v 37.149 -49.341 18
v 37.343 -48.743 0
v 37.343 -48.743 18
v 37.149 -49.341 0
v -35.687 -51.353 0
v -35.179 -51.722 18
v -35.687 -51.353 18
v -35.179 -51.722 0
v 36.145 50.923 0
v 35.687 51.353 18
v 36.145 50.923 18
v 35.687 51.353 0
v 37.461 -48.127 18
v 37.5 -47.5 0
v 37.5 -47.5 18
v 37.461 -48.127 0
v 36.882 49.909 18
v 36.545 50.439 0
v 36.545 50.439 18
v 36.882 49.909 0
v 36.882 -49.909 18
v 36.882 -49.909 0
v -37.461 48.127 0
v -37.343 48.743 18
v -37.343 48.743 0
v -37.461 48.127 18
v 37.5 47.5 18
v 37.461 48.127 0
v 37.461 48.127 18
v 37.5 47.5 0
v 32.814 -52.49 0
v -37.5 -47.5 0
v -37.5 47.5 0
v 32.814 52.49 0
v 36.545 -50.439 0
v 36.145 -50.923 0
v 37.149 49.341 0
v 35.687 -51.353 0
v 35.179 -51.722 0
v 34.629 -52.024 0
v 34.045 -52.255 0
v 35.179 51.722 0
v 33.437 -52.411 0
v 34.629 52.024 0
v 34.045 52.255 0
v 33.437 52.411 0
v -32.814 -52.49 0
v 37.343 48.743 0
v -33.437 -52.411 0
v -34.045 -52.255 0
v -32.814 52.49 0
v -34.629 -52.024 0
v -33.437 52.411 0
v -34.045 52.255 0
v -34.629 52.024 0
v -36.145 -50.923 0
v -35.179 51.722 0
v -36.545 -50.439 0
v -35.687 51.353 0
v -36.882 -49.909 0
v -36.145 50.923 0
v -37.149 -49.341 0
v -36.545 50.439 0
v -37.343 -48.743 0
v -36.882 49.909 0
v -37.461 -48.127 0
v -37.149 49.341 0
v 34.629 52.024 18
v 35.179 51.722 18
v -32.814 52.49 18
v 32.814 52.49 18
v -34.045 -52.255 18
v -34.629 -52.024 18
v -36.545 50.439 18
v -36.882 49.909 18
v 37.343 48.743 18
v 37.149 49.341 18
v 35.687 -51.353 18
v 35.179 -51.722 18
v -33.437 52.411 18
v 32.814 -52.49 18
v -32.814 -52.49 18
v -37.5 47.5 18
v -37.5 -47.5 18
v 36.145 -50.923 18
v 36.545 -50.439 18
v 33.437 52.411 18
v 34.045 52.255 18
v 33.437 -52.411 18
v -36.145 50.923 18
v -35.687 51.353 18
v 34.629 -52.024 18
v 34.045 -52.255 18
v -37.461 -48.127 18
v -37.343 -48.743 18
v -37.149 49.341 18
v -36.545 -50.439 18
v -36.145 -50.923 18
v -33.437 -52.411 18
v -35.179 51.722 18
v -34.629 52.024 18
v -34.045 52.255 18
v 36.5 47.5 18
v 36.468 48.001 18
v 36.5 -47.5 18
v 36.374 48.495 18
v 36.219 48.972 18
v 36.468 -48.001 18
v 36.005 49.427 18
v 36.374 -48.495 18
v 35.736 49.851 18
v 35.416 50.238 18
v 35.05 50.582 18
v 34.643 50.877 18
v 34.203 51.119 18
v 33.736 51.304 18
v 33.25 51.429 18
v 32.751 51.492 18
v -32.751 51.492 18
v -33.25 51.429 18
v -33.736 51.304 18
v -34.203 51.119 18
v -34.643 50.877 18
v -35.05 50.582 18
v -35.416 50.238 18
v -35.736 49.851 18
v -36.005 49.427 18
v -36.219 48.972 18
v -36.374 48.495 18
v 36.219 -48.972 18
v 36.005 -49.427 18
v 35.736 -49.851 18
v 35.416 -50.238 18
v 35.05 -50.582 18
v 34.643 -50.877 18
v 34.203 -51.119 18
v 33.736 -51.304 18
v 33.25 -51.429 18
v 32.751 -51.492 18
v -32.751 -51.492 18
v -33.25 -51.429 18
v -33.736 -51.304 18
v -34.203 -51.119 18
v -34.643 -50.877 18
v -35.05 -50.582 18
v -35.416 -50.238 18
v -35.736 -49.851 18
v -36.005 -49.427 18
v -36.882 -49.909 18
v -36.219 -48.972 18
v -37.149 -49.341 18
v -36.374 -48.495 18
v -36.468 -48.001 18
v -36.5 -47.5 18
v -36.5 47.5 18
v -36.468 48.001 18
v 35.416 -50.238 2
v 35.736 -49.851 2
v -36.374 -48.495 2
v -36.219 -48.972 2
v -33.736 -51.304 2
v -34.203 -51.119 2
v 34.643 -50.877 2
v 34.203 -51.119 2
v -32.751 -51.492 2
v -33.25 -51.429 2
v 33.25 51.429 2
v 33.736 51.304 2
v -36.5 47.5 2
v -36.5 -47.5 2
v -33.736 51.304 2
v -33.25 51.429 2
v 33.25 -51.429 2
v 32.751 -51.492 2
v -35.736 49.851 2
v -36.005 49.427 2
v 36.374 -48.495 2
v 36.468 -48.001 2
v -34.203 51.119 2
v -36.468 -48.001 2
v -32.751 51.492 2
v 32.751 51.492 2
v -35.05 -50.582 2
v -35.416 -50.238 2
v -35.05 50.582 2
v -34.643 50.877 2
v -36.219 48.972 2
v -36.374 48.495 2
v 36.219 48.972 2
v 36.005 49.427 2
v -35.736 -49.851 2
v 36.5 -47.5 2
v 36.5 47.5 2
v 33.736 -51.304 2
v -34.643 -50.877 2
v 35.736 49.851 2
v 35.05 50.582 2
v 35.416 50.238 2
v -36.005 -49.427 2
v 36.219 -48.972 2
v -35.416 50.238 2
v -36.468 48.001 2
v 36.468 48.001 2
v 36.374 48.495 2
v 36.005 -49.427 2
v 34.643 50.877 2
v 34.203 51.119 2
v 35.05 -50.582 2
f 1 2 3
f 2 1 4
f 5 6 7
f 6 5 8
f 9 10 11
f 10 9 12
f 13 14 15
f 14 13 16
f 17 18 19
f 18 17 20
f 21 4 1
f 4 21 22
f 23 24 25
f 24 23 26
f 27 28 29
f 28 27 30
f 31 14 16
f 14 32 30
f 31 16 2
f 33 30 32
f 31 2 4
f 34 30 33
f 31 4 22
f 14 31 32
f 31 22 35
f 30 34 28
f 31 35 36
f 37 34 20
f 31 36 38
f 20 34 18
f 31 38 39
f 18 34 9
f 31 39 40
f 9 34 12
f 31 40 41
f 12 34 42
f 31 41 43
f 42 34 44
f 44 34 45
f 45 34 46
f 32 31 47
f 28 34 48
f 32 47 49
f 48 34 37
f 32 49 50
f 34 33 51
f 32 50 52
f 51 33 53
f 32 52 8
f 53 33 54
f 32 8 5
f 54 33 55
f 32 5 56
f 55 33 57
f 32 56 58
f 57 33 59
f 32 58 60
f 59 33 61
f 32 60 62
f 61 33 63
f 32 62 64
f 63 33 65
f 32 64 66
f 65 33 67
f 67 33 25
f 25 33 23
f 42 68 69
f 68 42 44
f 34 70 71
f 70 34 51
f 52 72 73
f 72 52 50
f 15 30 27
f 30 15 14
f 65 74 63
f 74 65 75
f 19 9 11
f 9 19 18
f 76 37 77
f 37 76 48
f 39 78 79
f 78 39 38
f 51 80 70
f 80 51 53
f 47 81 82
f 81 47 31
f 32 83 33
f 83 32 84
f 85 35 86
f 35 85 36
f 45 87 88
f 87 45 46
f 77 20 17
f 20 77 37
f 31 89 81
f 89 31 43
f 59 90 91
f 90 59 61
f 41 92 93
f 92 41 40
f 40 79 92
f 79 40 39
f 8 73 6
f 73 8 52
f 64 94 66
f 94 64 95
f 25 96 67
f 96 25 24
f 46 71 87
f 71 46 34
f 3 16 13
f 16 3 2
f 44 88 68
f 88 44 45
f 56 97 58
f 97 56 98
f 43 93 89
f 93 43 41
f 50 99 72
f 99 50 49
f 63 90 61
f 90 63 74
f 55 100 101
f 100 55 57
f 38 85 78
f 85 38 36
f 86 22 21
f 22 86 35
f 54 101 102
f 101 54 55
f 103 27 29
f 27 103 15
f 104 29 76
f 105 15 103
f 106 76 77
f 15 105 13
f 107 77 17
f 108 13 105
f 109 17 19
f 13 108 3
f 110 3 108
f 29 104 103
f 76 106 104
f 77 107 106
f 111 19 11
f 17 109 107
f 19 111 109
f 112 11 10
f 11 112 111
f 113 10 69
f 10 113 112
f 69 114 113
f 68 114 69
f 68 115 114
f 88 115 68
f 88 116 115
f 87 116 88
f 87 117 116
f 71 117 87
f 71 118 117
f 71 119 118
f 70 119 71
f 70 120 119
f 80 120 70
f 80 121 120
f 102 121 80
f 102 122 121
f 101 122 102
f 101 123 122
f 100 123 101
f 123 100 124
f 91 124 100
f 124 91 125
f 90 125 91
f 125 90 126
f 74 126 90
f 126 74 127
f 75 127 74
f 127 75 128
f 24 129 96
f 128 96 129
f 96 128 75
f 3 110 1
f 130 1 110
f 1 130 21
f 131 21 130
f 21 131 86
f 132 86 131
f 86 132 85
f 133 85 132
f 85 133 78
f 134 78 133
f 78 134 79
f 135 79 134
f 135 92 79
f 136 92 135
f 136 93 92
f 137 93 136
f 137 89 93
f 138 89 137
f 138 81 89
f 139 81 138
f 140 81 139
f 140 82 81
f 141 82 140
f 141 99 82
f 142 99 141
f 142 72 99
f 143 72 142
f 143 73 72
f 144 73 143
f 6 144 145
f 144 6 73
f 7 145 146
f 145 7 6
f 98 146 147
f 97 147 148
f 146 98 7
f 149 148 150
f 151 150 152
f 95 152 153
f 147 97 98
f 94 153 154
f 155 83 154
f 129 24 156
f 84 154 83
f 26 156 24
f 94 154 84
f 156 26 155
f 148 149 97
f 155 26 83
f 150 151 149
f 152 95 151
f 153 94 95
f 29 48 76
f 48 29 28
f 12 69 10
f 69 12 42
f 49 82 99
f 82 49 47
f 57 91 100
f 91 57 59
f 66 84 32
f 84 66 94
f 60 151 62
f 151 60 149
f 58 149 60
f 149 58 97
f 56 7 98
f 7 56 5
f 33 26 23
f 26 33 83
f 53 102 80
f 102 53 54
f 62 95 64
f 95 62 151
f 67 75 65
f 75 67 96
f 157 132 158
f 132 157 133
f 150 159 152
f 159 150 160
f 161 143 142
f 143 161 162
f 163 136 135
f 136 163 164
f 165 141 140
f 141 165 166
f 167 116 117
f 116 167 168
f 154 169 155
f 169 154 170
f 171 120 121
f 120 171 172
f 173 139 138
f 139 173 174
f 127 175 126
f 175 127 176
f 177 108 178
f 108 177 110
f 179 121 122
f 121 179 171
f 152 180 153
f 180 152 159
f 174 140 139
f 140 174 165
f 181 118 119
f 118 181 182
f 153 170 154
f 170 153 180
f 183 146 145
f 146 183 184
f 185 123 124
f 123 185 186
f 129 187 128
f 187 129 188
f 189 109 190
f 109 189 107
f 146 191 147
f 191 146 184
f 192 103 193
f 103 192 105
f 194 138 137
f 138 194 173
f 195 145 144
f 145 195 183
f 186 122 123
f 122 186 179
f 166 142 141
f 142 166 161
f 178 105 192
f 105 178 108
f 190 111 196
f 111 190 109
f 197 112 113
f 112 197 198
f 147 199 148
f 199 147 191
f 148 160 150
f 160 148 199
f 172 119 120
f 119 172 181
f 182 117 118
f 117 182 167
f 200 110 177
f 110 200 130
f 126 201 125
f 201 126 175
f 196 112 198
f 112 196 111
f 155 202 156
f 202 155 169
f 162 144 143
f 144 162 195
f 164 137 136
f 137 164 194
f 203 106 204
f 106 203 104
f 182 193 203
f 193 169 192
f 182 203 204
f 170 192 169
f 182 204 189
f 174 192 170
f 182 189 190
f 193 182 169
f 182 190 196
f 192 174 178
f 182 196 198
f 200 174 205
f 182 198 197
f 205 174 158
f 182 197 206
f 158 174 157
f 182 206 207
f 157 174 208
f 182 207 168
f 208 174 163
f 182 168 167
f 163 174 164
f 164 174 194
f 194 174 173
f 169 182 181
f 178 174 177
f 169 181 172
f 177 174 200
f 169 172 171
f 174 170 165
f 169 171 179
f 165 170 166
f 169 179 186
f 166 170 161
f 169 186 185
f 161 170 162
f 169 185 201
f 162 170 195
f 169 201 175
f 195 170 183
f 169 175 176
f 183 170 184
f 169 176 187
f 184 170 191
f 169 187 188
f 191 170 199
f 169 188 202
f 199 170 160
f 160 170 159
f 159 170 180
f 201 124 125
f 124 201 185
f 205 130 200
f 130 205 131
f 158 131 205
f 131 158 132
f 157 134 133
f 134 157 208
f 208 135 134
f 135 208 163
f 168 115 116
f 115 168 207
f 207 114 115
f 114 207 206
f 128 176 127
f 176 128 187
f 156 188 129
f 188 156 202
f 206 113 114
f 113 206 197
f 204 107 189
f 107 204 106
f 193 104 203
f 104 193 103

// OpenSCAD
$fn = 50;


difference() {
	union() {
		hull() {
			translate(v = [-32.5000000000, 47.5000000000, 0]) {
				cylinder(h = 18, r = 5);
			}
			translate(v = [32.5000000000, 47.5000000000, 0]) {
				cylinder(h = 18, r = 5);
			}
			translate(v = [-32.5000000000, -47.5000000000, 0]) {
				cylinder(h = 18, r = 5);
			}
			translate(v = [32.5000000000, -47.5000000000, 0]) {
				cylinder(h = 18, r = 5);
			}
		}
	}
	union() {
		translate(v = [0, 0, 2]) {
			hull() {
				translate(v = [-32.5000000000, 47.5000000000, 0]) {
					cylinder(h = 16, r = 4);
				}
				translate(v = [32.5000000000, 47.5000000000, 0]) {
					cylinder(h = 16, r = 4);
				}
				translate(v = [-32.5000000000, -47.5000000000, 0]) {
					cylinder(h = 16, r = 4);
				}
				translate(v = [32.5000000000, -47.5000000000, 0]) {
					cylinder(h = 16, r = 4);
				}
			}
		}
	}
}
